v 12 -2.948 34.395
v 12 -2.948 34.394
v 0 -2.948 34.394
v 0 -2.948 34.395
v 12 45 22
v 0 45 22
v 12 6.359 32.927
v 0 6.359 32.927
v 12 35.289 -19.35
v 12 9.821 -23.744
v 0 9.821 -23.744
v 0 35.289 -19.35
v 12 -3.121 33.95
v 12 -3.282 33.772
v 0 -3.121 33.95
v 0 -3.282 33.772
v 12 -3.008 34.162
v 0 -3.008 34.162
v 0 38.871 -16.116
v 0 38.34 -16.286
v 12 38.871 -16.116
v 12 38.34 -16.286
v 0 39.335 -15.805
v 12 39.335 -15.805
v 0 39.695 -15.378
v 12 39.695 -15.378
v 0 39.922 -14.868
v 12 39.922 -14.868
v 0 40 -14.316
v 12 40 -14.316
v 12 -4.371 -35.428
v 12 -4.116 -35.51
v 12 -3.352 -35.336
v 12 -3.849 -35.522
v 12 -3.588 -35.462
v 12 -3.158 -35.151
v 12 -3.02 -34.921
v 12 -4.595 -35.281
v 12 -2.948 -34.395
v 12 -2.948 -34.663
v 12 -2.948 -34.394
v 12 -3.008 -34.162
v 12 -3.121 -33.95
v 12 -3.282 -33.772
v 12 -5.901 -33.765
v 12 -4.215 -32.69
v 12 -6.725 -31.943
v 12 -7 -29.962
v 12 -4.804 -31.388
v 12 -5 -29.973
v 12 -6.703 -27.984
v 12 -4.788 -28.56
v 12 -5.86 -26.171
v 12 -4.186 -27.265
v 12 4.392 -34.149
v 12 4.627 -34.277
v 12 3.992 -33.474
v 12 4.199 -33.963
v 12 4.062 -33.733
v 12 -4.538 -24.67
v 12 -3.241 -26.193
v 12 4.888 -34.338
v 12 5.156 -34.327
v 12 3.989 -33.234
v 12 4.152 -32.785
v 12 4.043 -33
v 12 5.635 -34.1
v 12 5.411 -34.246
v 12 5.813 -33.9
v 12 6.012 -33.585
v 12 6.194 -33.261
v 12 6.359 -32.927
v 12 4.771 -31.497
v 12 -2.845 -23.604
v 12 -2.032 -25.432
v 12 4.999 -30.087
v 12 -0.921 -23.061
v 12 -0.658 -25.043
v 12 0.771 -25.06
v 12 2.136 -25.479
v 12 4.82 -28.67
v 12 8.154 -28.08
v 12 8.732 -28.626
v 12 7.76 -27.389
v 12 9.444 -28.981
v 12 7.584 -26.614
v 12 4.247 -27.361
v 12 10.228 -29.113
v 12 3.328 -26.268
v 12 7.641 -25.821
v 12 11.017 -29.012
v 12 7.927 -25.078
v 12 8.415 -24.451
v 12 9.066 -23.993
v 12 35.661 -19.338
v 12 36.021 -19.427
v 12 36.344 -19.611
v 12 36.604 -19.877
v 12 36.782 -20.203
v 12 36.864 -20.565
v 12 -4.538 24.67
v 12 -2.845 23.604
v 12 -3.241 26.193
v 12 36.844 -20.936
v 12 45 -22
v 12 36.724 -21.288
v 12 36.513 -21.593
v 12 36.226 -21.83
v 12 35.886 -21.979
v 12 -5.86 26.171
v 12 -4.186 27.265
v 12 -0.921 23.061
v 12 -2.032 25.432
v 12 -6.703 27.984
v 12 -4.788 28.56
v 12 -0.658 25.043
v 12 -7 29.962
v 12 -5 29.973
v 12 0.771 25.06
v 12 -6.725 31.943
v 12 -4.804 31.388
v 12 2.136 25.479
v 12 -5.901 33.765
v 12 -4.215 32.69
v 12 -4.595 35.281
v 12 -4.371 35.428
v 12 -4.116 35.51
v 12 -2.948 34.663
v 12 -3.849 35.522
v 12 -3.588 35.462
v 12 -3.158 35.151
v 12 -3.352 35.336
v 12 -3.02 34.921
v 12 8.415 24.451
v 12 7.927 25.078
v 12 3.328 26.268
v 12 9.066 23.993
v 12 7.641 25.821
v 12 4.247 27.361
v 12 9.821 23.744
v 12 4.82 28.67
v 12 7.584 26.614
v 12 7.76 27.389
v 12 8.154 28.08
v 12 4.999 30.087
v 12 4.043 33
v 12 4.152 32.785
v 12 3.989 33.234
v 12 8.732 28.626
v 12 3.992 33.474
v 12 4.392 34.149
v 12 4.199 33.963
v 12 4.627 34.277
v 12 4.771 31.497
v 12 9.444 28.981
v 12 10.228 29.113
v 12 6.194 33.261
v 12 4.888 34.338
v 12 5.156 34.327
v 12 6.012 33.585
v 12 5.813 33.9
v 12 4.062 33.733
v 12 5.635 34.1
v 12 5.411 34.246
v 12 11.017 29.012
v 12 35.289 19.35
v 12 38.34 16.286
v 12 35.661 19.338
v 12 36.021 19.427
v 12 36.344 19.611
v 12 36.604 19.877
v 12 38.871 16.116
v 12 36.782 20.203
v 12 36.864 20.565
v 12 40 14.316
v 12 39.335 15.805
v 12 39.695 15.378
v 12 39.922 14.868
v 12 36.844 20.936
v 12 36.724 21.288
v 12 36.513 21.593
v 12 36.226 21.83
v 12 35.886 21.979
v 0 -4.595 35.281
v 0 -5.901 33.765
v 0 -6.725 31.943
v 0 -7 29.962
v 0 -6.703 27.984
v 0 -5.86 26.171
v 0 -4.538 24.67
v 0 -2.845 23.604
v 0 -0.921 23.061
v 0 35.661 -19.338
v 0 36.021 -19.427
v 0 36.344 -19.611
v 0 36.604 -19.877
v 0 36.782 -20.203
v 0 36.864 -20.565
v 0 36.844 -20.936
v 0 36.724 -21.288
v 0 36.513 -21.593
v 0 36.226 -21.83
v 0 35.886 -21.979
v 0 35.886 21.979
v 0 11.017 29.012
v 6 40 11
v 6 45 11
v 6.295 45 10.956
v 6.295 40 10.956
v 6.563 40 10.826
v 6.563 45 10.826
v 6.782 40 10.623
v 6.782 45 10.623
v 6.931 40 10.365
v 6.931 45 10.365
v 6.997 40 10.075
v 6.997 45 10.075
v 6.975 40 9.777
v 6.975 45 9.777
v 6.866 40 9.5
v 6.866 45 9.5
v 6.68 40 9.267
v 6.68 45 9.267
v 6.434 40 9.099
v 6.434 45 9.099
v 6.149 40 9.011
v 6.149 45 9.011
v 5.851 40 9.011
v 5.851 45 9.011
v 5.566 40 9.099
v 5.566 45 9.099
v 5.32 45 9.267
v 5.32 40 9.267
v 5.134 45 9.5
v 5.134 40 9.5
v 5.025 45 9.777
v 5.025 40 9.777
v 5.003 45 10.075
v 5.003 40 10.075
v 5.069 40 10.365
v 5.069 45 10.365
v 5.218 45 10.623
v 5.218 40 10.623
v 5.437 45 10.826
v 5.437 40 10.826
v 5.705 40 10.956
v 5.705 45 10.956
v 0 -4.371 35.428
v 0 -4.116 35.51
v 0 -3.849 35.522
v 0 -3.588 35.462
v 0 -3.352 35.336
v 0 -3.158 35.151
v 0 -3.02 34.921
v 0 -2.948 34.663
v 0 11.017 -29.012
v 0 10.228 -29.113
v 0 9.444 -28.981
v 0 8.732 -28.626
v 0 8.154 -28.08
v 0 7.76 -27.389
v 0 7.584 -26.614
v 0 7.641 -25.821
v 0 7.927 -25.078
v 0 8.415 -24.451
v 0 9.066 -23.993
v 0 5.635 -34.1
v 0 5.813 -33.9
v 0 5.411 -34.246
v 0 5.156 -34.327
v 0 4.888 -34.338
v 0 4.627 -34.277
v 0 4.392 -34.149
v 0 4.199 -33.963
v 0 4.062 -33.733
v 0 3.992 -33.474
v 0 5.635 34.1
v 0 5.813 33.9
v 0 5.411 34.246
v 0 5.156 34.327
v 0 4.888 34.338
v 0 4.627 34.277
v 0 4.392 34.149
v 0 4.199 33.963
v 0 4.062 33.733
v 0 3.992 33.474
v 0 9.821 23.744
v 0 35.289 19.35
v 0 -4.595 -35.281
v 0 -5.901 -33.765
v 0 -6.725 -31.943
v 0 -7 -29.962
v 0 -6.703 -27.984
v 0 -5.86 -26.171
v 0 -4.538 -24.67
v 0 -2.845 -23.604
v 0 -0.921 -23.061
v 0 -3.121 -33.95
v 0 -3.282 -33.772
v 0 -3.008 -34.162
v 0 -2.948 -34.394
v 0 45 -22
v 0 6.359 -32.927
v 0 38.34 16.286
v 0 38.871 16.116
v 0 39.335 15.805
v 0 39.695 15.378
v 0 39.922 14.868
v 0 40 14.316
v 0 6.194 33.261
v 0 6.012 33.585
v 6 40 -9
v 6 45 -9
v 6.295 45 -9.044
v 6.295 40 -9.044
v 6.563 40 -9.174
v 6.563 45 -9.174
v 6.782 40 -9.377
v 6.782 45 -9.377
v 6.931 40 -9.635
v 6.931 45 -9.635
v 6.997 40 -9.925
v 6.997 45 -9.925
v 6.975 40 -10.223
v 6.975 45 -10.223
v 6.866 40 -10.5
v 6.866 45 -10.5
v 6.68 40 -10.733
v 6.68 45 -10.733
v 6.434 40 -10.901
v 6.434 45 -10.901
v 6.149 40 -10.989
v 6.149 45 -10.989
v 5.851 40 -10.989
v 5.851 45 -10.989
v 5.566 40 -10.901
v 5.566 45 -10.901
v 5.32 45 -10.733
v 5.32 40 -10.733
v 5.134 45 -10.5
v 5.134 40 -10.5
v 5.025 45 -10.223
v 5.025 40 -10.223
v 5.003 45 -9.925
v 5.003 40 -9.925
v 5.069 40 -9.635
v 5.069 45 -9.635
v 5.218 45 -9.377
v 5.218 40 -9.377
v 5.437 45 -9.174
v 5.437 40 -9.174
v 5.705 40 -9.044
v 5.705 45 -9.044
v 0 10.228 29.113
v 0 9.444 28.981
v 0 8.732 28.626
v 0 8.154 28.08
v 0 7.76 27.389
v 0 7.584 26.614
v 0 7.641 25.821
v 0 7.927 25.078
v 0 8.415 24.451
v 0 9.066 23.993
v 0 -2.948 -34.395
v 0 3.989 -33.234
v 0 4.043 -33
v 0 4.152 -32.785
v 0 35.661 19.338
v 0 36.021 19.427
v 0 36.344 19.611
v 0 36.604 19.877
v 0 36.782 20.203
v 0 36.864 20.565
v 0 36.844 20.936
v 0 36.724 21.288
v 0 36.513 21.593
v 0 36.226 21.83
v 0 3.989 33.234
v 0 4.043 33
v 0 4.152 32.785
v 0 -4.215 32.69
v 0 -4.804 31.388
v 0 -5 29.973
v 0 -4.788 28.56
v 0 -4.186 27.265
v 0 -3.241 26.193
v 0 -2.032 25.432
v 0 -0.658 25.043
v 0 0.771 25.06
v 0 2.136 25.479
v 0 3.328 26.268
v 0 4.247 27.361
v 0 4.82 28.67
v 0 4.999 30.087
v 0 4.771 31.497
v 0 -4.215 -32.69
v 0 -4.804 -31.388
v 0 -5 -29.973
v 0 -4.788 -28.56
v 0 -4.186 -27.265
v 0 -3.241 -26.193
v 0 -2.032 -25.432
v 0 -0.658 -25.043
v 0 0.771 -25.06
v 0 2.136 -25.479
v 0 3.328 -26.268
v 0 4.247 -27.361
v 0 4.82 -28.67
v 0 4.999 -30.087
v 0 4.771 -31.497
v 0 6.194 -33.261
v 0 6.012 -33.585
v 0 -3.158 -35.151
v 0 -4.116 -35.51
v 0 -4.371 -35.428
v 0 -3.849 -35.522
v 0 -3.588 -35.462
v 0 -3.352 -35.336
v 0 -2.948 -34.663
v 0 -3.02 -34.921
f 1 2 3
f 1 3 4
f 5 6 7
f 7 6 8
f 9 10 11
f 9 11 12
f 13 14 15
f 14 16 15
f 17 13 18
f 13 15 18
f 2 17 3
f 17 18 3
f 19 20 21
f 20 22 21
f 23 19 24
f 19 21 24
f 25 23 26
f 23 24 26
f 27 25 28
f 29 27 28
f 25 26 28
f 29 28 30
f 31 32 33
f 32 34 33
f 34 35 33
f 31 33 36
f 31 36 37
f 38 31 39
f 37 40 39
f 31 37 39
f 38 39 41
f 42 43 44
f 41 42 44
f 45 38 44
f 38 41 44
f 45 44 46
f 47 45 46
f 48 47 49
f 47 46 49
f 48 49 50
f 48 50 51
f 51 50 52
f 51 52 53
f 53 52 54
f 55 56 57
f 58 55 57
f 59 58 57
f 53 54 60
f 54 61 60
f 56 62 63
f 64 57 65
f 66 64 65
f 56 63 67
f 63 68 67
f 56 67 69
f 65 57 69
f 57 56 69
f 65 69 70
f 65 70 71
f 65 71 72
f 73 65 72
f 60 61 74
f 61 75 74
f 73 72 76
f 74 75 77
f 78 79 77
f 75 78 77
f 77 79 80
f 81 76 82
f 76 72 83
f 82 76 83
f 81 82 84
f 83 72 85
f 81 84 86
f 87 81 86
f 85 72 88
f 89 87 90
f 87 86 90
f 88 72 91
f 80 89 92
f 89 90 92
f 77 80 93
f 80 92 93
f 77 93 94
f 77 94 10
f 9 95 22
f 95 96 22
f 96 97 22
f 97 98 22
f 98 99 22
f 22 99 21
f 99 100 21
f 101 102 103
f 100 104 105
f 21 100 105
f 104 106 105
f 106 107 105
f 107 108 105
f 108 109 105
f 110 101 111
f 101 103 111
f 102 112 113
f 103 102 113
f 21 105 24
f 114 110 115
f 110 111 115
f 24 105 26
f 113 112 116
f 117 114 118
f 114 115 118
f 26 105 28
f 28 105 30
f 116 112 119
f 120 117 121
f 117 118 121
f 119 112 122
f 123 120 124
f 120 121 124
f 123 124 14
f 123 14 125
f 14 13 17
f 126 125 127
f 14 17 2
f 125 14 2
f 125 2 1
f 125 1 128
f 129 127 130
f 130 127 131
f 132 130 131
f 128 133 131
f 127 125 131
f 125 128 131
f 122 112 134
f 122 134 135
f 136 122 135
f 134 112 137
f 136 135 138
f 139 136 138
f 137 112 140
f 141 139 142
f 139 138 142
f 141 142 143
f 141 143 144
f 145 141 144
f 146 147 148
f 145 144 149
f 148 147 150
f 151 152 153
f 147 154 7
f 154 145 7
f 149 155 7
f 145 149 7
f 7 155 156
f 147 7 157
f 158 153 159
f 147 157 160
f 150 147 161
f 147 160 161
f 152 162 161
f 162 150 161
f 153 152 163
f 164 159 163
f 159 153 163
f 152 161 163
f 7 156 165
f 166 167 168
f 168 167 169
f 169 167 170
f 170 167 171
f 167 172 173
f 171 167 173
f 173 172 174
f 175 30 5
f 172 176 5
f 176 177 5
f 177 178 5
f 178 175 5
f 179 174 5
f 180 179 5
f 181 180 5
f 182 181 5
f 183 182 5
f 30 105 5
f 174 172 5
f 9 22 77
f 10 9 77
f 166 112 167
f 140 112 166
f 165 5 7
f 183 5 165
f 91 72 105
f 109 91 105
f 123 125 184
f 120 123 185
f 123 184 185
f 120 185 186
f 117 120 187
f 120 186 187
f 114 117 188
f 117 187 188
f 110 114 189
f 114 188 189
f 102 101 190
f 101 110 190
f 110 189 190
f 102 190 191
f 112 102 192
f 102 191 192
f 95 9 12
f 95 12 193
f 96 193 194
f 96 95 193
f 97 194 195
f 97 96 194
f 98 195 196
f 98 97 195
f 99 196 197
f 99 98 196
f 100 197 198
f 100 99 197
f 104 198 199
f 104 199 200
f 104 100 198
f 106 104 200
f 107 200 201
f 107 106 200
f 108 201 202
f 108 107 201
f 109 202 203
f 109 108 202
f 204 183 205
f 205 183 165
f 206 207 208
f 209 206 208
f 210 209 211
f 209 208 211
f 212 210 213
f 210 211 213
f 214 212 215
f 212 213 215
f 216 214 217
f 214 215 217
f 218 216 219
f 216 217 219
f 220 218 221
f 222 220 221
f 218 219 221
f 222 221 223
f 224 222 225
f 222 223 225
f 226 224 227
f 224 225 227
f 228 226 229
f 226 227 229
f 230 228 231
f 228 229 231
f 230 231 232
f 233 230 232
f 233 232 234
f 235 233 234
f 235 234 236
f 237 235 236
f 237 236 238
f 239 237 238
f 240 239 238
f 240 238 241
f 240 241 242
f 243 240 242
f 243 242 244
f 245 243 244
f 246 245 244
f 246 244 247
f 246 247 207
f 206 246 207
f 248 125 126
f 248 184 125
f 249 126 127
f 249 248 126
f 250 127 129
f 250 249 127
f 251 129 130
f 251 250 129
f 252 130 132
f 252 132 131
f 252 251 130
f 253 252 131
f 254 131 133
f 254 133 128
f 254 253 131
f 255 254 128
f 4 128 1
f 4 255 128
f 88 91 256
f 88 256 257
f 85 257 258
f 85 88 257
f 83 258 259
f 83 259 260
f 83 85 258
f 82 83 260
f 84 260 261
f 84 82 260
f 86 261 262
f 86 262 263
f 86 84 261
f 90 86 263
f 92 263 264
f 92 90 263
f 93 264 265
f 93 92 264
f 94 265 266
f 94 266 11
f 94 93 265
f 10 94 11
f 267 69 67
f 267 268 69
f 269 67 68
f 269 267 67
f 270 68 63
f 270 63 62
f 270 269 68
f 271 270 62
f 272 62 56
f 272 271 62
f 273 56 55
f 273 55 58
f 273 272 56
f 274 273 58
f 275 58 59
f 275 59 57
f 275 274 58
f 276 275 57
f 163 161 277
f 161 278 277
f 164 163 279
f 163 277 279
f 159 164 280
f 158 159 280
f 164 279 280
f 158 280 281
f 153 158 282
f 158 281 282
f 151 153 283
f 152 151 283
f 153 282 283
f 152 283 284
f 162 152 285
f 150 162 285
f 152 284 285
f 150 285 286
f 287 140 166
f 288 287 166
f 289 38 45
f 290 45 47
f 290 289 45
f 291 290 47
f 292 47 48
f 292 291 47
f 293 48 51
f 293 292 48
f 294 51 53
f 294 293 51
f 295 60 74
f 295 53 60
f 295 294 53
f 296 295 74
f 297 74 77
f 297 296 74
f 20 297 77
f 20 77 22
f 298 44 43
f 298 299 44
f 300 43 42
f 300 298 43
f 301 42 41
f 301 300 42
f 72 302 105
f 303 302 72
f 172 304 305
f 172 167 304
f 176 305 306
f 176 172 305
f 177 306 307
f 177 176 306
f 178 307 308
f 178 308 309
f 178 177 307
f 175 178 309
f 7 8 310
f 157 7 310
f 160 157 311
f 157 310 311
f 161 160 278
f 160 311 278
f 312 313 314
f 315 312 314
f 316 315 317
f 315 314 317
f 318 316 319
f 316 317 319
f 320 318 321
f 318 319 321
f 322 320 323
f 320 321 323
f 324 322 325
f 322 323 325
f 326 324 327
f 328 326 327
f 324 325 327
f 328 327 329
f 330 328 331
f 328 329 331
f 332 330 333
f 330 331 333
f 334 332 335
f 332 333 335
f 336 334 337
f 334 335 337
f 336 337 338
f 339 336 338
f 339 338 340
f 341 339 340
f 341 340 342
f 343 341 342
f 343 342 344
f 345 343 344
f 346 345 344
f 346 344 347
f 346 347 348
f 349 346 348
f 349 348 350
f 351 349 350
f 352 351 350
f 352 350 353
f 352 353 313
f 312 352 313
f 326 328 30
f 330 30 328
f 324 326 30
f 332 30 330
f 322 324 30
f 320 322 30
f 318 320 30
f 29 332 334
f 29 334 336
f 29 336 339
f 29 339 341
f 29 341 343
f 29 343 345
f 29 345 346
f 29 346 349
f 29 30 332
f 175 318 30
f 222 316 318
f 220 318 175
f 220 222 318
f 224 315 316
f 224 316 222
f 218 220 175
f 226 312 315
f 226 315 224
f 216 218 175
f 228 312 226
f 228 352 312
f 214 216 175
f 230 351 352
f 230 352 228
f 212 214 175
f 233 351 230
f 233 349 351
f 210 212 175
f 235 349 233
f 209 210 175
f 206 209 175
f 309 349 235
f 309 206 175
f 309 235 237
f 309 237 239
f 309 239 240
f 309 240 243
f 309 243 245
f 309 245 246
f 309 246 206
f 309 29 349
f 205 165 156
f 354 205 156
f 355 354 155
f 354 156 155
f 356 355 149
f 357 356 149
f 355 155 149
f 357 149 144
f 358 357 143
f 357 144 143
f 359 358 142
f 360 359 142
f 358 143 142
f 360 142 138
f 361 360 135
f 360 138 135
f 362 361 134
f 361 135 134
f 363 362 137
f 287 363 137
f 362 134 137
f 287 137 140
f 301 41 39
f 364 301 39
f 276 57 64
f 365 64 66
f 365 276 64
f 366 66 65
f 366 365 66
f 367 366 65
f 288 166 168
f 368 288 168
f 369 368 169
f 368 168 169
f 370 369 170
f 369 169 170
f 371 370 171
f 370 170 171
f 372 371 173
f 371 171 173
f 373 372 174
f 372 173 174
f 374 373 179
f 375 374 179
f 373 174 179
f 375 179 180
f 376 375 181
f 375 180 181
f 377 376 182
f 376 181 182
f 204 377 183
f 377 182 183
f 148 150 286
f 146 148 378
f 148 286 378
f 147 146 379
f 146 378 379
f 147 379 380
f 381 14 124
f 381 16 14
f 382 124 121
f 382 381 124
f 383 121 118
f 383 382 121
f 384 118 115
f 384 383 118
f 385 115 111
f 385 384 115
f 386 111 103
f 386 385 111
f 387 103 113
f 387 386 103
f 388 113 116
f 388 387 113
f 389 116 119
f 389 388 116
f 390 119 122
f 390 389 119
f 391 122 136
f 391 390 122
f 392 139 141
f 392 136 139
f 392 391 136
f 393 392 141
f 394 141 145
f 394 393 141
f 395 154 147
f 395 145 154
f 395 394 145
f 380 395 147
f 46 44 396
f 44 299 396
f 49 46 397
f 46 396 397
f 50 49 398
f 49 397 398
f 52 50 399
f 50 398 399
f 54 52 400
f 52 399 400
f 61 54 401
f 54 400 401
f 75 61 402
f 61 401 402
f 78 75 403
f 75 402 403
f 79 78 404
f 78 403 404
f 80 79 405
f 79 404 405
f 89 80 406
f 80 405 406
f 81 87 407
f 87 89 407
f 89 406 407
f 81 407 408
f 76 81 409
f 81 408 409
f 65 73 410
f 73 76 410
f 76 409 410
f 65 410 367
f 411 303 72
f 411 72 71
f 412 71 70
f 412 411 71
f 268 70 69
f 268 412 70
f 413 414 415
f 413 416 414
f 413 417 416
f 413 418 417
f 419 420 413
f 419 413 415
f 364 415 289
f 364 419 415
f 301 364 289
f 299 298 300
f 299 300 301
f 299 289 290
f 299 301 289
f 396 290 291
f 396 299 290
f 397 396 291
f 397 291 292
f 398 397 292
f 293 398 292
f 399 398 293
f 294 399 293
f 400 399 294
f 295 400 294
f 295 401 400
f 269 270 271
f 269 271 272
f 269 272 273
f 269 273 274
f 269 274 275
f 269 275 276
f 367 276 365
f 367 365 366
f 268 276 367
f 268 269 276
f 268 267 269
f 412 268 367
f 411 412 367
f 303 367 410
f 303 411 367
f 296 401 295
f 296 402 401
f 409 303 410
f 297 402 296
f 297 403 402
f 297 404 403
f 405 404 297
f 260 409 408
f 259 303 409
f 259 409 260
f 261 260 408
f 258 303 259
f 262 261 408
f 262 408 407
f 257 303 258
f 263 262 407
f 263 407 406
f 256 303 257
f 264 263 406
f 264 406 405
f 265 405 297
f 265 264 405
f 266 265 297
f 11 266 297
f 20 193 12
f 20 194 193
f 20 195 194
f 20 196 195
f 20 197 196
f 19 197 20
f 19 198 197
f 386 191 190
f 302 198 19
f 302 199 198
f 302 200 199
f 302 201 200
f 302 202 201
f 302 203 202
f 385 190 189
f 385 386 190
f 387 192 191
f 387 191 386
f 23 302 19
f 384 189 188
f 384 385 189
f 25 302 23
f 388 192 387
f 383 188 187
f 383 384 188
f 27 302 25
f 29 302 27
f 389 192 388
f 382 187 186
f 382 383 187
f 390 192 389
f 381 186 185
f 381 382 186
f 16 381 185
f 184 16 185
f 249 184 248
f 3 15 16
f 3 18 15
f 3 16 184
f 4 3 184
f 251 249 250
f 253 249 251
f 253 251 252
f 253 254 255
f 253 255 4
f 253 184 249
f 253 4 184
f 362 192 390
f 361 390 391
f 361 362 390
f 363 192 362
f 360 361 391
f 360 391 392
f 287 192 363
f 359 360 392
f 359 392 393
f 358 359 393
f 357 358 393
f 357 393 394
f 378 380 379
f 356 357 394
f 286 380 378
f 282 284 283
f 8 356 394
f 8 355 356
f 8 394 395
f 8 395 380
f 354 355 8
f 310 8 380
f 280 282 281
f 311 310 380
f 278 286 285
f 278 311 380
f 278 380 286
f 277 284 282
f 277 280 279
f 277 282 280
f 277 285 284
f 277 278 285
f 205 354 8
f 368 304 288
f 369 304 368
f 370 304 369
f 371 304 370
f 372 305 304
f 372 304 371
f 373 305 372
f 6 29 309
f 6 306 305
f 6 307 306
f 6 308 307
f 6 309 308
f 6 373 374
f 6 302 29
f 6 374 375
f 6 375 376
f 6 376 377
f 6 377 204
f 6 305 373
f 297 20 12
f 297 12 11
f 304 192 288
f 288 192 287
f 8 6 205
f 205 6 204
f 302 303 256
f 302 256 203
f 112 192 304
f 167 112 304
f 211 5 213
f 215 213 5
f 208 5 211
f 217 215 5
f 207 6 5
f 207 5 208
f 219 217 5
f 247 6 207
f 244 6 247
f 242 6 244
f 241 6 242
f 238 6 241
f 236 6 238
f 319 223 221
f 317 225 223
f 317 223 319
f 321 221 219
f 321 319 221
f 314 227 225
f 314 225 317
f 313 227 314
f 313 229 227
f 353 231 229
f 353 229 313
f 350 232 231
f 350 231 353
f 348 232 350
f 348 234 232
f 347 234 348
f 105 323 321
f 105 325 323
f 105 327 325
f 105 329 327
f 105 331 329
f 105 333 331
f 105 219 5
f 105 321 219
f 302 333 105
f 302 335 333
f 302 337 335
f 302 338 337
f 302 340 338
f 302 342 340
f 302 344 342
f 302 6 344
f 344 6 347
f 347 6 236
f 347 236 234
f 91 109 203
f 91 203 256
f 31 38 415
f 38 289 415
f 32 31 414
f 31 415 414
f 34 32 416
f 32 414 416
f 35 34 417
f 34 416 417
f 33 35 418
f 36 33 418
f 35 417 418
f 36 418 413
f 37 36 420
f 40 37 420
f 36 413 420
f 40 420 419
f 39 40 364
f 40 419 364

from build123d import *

# Parameters (mm, degrees)
SKETCH1_R           = 7
SKETCH1_R_2         = 5
BOSS_EXTRUDE1_DEPTH = 12
CUT_EXTRUDE1_DEPTH  = 40.522145691
FILLET1_R           = 1
BOSS_EXTRUDE2_START = -12
BOSS_EXTRUDE2_DEPTH = 12
FILLET2_R           = 2
CUT_EXTRUDE2_DEPTH  = 59.575636594
SKETCH7_R           = 1
CUT_EXTRUDE3_DEPTH  = 65.110102187


with BuildPart() as part:
    # Sketch1 → Boss-Extrude1 (new body)
    with BuildSketch(Plane(origin=(0, 0, 0), x_dir=(0, 0, -1), z_dir=(1, 0, 0))):
        with Locations((-30, 0)):
            Circle(SKETCH1_R)
        with Locations((-30, 0)):
            Circle(SKETCH1_R_2, mode=Mode.SUBTRACT)
    extrude(amount=BOSS_EXTRUDE1_DEPTH)

    # Sketch3 → Cut-Extrude1 (cut, through all)
    with BuildSketch(Plane(origin=(12, 0, 0), x_dir=(0, 0, -1), z_dir=(1, 0, 0))):
        Polygon((-26, 3), (-26.92060006, -3.93919992), (-40.375880399, -2.154133626), (-39.455280339, 4.785066294), align=None)
    extrude(amount=-CUT_EXTRUDE1_DEPTH, mode=Mode.SUBTRACT)

    # Fillet1
    fillet1_edges = [part.edges().sort_by_distance(p)[0] for p in [
        (6, 3.93919992, 33.07939994),
        (6, 4.266862999, 35.549223383),
        (6, -3, 34),
        (6, -2.672336921, 36.469823443),
    ]]
    fillet(fillet1_edges, radius=FILLET1_R - 0.0001)  # a hair under: the kernel refuses the full size

    # Sketch4 → Boss-Extrude2 (add)
    with BuildSketch(Plane(origin=(12, 0, 0), x_dir=(0, 0, -1), z_dir=(1, 0, 0)).offset(BOSS_EXTRUDE2_START)):
        with BuildLine():
            Line((-23.06080008, -0.92060006), (-16, 40))
            Line((-16, 40), (0, 40))
            Line((0, 40), (0, 45))
            Line((0, 45), (-22, 45))
            Line((-22, 45), (-32.927058907, 6.358641848))
            ThreePointArc((-32.927058907, 6.358641848), (-25.844141537, 5.632835914), (-23.06080008, -0.92060006))
        make_face()
    extrude(amount=BOSS_EXTRUDE2_DEPTH)

    # Fillet2
    fillet2_edges = [part.edges().sort_by_distance(p)[0] for p in [
        (6, 40, 16),
    ]]
    fillet(fillet2_edges, radius=FILLET2_R)

    # Sketch6 → Cut-Extrude2 (cut, through all)
    with BuildSketch(Plane(origin=(12, 0, 0), x_dir=(0, 0, -1), z_dir=(1, 0, 0))):
        with BuildLine():
            Line((-23.744298761, 9.820968741), (-19.349752742, 35.289394134))
            ThreePointArc((-19.349752742, 35.289394134), (-20.381234985, 36.835447129), (-21.979152767, 35.886292641))
            Line((-21.979152767, 35.886292641), (-29.011800399, 11.016740989))
            ThreePointArc((-29.011800399, 11.016740989), (-27.008090108, 7.643460534), (-23.744298761, 9.820968741))
        make_face()
    extrude(amount=-CUT_EXTRUDE2_DEPTH, mode=Mode.SUBTRACT)

    # Mirror9: part across plane


with BuildPart() as part_1:
    add(part.part)
    add(part.part.mirror(Plane(origin=(-56.505687485, 40, 0), x_dir=(1, 0, 0), z_dir=(0, 0, -1))))

    # Sketch7 → Cut-Extrude3 (cut, through all)
    with BuildSketch(Plane(origin=(0, 45, 0), x_dir=(1, 0, 0), z_dir=(0, 1, 0))):
        with Locations(Location((6, -10, 0), (0, 0, 270))):
            Circle(SKETCH7_R)
        with Locations(Location((6, 10, 0), (0, 0, 270))):
            Circle(SKETCH7_R)
    extrude(amount=-CUT_EXTRUDE3_DEPTH, mode=Mode.SUBTRACT)


solid = part_1.part
